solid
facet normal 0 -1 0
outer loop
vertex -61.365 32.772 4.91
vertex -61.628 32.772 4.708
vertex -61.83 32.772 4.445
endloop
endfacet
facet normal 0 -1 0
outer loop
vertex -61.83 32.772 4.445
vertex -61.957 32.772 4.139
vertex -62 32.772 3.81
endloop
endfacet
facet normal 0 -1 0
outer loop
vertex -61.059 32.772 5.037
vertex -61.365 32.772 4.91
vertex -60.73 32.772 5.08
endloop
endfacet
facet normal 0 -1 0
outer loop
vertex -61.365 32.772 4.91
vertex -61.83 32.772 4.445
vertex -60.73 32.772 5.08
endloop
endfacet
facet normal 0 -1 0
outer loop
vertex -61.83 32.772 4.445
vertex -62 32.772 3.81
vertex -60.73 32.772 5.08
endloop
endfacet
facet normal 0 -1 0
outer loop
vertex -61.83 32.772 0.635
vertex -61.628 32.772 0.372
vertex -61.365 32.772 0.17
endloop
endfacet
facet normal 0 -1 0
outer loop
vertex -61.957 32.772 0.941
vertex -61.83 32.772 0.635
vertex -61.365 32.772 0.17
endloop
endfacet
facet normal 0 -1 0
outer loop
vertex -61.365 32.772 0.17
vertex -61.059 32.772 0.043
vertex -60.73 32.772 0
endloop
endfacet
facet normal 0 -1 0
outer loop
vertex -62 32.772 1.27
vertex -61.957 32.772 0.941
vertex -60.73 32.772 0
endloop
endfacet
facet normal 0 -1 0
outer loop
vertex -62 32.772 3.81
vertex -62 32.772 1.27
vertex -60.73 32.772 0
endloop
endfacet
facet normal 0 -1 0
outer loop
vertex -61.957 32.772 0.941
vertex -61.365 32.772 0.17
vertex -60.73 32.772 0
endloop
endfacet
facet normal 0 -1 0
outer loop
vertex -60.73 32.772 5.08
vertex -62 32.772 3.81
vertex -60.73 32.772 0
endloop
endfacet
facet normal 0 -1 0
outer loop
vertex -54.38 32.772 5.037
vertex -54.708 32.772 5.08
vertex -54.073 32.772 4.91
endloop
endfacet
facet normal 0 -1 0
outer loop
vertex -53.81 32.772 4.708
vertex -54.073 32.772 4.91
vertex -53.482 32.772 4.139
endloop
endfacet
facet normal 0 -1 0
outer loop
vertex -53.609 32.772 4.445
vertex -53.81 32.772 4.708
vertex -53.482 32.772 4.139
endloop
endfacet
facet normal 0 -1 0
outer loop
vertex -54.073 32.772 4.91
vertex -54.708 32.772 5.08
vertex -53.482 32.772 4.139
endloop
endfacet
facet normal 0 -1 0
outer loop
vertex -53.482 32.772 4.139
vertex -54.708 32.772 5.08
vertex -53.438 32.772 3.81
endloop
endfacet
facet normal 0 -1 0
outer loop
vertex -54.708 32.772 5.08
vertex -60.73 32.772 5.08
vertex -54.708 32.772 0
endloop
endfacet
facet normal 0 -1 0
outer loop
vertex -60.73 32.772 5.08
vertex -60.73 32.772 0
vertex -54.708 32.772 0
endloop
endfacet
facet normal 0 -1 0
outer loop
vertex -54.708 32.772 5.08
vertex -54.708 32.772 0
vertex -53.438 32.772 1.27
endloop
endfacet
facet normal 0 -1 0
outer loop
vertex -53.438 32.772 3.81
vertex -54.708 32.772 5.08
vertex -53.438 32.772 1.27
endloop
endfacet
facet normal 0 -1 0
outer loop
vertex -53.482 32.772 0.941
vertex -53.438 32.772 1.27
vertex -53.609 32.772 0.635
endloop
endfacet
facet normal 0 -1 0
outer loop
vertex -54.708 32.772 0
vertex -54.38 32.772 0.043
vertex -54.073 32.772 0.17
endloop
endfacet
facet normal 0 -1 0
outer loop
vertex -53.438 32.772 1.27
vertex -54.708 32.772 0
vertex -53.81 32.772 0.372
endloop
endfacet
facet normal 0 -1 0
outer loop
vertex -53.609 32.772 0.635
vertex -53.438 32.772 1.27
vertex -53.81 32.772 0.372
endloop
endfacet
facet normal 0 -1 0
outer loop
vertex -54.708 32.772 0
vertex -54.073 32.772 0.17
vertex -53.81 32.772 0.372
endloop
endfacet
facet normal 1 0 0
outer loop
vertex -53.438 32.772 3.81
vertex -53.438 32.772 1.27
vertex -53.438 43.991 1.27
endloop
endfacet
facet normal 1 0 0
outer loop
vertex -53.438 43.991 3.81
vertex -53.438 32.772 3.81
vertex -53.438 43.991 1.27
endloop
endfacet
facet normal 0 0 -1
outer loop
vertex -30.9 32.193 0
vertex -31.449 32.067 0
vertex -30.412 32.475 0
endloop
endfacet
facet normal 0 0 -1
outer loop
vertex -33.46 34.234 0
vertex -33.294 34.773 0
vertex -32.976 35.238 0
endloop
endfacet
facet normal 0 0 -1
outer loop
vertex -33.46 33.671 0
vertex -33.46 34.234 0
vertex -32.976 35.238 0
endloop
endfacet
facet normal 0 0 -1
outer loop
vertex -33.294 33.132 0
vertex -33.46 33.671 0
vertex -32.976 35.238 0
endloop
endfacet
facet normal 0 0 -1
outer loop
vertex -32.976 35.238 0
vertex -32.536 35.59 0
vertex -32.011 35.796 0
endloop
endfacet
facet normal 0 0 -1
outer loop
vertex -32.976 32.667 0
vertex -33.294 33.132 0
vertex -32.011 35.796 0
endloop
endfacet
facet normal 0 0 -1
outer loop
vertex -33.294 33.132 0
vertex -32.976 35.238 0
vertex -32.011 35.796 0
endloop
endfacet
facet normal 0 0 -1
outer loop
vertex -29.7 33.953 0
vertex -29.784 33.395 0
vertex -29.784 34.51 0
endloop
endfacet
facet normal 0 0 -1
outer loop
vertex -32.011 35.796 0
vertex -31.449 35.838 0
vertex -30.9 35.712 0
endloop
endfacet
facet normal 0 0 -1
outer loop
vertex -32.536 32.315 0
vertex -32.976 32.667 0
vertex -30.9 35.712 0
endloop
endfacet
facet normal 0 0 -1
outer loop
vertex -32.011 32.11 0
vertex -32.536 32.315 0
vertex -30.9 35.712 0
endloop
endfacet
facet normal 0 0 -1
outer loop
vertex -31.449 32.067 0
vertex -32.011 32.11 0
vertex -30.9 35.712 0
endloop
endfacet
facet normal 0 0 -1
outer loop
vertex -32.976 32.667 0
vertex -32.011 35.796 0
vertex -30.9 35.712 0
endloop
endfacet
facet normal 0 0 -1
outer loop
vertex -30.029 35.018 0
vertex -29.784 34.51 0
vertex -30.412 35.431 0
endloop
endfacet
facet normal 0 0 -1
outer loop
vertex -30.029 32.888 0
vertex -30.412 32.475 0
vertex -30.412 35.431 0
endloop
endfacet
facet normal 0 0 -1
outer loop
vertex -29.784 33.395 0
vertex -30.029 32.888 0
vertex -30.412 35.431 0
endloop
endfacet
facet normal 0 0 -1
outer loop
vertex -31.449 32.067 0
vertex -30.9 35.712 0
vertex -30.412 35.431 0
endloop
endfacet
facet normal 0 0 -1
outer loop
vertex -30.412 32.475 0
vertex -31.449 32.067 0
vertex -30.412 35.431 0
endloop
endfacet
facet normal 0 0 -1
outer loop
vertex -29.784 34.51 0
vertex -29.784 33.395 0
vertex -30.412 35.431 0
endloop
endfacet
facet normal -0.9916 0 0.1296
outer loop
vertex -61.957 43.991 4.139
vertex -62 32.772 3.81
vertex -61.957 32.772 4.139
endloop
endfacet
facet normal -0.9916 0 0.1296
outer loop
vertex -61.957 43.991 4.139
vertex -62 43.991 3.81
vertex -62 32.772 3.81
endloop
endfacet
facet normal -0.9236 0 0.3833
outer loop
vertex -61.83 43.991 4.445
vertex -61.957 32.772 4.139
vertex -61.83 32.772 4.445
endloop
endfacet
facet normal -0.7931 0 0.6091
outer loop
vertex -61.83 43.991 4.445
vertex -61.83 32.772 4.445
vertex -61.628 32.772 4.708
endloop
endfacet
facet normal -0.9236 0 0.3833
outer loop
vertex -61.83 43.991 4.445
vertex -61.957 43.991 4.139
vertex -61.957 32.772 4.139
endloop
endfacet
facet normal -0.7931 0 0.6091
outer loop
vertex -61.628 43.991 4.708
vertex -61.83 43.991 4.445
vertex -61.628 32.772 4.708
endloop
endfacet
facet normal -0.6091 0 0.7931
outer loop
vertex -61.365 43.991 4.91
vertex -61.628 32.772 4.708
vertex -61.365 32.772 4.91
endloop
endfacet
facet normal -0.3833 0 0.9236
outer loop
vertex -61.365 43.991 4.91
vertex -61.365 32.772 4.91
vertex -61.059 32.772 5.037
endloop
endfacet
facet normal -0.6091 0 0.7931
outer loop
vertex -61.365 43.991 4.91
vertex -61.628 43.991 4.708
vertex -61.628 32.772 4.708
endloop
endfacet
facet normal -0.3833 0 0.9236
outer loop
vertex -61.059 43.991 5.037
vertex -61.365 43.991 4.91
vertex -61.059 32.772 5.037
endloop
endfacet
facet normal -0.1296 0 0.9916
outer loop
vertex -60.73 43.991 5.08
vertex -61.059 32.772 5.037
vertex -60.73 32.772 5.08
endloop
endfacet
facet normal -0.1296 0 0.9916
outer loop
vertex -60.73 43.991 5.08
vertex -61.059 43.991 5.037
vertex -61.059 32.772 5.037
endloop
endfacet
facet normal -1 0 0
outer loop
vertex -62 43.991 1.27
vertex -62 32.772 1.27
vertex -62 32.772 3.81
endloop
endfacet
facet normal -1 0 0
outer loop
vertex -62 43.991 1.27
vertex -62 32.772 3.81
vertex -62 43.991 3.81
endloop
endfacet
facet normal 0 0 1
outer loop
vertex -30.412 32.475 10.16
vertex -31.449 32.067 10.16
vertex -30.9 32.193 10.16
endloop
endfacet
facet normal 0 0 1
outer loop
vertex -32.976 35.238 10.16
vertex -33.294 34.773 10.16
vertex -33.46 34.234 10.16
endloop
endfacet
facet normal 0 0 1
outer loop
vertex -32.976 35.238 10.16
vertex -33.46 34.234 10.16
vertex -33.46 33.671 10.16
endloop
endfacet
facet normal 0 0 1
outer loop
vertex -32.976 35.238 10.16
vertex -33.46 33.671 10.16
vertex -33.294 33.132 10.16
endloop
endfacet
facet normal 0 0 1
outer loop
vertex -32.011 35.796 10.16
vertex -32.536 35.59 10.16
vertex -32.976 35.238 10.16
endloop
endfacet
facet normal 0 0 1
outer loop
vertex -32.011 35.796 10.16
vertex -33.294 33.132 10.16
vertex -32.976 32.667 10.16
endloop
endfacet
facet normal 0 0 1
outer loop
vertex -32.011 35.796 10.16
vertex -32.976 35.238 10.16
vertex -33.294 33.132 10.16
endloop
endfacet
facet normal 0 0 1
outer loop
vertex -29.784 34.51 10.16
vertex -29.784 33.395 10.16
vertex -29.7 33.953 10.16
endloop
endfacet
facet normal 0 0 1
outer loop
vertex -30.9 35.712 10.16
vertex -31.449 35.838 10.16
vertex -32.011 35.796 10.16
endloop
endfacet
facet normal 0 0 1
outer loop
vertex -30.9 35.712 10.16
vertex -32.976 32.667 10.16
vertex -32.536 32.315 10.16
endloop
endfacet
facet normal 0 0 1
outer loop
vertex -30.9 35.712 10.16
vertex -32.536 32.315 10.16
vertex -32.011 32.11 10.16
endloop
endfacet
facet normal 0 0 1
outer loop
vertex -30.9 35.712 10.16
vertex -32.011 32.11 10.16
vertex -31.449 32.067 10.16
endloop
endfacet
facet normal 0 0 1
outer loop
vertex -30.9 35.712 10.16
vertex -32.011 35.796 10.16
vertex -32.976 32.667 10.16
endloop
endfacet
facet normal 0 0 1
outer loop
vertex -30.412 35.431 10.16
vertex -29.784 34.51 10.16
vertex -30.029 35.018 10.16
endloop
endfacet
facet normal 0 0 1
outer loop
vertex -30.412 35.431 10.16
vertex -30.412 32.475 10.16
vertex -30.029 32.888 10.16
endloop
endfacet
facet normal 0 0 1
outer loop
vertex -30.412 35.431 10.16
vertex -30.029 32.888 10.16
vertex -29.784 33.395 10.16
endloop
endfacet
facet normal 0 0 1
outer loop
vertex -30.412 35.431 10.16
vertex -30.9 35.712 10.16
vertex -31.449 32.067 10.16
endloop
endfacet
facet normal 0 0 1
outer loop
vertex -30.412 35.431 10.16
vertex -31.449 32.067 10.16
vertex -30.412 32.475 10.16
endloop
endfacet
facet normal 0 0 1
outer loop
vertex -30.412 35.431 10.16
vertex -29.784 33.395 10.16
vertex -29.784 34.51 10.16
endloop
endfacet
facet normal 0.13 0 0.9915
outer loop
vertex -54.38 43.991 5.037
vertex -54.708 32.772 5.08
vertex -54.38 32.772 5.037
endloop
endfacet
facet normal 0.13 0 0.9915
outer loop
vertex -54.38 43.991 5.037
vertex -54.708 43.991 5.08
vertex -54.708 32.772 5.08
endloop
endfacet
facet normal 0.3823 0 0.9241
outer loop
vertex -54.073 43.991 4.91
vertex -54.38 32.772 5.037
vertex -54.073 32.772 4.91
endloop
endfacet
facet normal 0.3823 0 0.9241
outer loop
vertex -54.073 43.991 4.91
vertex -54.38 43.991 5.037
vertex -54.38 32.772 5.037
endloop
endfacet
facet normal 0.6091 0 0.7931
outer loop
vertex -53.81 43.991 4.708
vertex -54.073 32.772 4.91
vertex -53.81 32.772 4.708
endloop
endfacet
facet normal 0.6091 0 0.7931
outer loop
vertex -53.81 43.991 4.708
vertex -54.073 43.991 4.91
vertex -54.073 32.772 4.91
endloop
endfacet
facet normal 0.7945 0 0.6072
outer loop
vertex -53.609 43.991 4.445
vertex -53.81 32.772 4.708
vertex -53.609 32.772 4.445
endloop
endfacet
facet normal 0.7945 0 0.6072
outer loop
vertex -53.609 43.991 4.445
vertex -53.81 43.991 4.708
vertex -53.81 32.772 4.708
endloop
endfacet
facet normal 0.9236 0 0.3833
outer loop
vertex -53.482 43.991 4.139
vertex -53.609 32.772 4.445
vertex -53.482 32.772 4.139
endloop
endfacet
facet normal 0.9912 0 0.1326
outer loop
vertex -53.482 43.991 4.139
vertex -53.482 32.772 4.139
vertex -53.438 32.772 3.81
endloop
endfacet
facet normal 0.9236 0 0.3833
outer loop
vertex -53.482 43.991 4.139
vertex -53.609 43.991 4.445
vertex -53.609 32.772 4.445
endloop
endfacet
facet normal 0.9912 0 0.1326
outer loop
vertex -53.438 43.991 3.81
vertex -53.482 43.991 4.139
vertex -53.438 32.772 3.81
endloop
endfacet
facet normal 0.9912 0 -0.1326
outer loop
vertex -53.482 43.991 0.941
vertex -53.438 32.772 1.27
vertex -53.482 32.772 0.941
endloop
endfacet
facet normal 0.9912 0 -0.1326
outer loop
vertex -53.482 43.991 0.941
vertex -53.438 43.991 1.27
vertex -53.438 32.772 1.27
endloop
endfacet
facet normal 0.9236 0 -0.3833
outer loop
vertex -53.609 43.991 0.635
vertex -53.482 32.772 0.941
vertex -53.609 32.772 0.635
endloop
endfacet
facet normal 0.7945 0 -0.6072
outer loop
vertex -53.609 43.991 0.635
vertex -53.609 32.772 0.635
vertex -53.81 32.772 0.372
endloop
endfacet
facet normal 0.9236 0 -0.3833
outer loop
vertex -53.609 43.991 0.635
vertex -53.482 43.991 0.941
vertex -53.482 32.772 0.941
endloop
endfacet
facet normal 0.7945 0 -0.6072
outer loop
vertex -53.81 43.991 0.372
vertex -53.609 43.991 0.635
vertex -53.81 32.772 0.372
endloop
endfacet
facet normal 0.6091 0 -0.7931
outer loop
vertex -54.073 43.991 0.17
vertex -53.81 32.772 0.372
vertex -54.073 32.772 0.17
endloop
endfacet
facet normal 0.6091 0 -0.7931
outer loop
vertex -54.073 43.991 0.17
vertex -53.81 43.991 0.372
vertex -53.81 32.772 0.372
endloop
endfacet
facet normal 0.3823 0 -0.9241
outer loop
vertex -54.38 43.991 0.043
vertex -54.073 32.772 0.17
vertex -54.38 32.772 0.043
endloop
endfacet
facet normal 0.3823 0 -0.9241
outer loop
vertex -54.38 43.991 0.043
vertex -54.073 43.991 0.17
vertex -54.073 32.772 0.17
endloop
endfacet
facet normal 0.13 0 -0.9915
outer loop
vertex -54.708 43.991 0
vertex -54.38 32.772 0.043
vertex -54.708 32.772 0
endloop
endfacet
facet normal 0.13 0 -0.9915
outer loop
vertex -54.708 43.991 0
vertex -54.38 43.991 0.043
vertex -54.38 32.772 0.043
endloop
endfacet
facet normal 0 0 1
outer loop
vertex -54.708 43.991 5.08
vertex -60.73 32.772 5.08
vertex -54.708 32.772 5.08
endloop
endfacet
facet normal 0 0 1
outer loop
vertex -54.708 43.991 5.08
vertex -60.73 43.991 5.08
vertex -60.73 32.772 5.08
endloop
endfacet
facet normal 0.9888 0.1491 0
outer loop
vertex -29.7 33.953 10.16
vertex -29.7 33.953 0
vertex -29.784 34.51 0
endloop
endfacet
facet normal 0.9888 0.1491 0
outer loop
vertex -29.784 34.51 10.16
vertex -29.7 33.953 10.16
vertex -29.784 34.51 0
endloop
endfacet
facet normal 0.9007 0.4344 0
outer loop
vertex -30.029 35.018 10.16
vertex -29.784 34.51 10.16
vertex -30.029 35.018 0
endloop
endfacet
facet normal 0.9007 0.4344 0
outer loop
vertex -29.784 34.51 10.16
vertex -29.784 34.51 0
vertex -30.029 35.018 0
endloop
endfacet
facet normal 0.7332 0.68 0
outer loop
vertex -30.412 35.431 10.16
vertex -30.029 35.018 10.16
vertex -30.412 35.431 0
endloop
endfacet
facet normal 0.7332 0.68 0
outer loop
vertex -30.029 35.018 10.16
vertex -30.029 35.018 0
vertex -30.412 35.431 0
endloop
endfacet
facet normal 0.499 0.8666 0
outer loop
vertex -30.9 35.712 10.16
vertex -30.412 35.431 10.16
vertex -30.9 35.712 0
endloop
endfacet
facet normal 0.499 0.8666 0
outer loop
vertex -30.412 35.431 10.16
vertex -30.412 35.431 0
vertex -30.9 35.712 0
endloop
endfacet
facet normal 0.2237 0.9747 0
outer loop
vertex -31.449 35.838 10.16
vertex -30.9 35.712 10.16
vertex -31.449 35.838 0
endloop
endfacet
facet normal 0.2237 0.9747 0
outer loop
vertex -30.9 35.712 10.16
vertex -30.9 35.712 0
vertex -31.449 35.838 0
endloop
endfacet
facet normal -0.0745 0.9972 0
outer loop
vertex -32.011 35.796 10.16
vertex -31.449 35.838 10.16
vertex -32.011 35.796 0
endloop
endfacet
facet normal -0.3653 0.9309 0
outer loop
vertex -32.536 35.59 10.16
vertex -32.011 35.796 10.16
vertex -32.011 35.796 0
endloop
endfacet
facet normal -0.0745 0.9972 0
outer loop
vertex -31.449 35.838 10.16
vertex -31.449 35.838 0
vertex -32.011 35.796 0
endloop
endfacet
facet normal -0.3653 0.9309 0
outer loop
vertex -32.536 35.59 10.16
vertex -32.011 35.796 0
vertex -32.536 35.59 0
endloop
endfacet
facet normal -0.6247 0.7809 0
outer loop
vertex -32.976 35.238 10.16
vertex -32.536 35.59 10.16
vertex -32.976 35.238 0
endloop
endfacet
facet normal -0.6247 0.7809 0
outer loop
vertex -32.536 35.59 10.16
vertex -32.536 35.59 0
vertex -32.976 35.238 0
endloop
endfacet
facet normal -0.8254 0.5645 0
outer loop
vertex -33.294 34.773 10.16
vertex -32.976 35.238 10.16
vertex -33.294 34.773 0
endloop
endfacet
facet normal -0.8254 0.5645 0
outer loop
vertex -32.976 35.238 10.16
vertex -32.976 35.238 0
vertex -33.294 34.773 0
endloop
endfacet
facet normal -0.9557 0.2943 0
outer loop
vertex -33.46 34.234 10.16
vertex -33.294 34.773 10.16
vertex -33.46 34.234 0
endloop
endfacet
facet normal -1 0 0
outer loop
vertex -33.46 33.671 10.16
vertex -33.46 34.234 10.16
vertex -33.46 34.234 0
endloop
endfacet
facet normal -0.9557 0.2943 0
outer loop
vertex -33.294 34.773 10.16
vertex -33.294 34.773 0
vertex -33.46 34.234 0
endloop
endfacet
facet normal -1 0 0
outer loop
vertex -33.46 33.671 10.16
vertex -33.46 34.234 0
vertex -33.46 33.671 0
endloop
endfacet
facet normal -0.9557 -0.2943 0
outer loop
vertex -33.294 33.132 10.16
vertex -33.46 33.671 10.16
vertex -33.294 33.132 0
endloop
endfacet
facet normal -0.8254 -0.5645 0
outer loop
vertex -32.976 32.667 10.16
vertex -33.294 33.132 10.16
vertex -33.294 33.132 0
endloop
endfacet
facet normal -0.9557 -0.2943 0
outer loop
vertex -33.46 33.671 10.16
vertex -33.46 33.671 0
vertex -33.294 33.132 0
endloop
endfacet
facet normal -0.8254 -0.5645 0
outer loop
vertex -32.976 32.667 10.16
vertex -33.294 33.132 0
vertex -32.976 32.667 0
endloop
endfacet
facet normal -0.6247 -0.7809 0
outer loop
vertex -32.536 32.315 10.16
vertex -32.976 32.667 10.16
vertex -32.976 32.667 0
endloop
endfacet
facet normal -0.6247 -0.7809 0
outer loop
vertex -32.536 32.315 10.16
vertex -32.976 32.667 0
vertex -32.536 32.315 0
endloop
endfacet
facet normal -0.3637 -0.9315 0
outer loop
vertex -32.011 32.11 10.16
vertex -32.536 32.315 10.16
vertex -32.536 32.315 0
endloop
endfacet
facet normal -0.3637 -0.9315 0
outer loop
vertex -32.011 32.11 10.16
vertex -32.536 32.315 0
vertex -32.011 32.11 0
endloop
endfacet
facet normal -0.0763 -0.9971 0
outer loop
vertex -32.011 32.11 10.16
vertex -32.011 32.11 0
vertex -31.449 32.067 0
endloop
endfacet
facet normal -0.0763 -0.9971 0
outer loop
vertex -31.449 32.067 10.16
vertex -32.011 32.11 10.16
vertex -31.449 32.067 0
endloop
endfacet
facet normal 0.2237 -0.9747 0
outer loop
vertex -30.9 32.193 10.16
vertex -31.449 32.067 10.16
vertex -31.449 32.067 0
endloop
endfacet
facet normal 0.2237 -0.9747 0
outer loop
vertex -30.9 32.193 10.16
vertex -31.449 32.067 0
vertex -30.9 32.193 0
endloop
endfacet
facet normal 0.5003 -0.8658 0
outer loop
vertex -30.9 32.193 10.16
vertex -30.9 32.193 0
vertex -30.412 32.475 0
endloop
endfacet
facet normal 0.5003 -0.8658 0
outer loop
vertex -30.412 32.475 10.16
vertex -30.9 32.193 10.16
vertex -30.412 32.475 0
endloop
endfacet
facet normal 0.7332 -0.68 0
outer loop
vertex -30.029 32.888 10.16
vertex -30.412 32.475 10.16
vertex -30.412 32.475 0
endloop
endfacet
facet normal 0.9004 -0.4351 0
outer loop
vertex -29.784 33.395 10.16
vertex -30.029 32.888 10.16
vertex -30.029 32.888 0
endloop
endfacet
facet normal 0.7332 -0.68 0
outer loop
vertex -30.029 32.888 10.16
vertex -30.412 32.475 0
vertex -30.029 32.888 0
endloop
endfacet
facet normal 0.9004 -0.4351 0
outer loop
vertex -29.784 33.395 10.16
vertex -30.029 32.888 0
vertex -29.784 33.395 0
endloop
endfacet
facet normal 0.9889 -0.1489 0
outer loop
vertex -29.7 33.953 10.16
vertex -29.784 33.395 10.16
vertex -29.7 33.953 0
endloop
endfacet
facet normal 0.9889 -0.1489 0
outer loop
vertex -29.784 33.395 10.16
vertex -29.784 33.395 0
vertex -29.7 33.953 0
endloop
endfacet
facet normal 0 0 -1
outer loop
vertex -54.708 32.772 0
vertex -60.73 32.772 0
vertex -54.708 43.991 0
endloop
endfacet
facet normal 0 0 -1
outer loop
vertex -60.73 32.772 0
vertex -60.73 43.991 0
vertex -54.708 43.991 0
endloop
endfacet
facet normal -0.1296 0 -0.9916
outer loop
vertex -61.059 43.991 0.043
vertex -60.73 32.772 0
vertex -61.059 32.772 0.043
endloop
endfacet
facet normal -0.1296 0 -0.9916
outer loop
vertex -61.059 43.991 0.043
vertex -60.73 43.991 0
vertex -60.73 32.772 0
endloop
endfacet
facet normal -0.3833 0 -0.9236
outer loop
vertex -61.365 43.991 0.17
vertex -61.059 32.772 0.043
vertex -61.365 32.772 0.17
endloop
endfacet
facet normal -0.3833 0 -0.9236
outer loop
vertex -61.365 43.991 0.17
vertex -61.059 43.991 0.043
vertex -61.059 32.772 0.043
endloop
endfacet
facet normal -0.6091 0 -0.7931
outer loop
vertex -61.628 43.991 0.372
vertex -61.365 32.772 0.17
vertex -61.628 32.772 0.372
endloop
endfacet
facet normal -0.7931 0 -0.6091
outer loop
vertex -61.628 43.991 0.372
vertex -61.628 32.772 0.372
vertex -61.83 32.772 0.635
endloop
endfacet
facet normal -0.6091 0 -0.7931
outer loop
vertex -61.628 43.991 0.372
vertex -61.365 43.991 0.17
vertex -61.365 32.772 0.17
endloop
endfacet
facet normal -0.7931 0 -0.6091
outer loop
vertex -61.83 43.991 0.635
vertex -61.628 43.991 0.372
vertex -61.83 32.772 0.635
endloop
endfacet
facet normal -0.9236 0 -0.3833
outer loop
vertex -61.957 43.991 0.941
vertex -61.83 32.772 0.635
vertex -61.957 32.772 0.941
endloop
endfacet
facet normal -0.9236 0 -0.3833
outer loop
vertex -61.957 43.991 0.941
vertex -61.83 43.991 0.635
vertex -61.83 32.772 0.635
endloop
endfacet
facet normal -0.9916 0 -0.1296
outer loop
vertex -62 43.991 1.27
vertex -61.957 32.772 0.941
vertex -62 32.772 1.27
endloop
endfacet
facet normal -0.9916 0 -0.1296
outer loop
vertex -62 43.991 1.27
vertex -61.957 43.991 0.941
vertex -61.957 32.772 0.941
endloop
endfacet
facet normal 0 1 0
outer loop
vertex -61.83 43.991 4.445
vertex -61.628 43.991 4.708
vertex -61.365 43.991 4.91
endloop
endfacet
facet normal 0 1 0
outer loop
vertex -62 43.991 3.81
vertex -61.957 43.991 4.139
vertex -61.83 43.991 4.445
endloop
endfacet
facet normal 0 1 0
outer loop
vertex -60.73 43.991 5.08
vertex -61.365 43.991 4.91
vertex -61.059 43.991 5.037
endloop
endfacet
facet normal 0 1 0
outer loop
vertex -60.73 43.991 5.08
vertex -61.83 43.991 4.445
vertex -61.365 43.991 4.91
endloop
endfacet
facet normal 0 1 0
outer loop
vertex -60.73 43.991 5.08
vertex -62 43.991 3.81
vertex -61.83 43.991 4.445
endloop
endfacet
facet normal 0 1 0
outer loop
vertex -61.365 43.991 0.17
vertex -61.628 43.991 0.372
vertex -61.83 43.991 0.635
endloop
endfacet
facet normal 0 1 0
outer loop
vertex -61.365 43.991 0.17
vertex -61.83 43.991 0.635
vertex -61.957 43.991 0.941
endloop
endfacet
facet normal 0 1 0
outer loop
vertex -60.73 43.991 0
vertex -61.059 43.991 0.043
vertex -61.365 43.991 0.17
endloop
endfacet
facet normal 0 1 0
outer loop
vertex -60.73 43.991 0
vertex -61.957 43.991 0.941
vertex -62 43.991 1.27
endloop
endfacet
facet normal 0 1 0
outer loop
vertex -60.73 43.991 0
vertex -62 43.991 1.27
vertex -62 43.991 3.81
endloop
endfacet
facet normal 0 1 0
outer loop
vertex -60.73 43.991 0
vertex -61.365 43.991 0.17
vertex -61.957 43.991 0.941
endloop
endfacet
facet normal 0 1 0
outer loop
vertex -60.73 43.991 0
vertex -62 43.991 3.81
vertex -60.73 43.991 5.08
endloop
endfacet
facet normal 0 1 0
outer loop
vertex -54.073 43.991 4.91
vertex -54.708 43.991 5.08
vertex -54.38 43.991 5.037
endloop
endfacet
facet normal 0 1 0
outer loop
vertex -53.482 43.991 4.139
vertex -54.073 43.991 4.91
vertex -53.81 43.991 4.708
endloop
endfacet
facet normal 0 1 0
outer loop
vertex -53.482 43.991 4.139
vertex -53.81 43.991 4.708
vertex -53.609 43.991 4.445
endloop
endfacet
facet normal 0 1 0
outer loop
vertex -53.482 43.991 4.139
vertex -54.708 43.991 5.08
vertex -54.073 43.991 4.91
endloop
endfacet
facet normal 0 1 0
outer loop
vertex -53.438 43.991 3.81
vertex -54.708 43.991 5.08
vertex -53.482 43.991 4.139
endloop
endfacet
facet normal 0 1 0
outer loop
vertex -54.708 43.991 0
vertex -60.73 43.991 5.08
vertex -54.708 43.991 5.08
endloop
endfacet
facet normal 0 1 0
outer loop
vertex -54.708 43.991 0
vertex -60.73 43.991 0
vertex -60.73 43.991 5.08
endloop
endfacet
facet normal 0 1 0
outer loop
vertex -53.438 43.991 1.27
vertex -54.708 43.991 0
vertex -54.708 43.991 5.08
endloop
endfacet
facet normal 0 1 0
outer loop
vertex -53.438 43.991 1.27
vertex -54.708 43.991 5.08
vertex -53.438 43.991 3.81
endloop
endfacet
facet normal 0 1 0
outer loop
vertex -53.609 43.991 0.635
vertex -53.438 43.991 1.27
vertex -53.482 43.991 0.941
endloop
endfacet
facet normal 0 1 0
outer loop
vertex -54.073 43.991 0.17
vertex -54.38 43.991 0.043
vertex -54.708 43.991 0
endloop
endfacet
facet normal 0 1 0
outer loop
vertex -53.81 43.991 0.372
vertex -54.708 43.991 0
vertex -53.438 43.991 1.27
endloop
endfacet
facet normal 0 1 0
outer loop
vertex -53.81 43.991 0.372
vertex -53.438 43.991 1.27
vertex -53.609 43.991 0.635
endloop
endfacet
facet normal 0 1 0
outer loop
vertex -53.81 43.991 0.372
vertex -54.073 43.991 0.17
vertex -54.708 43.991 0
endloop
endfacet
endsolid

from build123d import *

# Parameters (mm, degrees)
F0_R     = 1.890456
F1_DEPTH = 10.16
F2_W     = 8.561958
F2_H     = 11.21911
F3_DEPTH = 5.08
F4_R     = 1.27
F5_R     = 1.27
F6_R     = 1.27
F7_R     = 1.27


with BuildPart() as f1:
    # F0 (on Top) → F1 (new body)
    with BuildSketch(Plane.XY):
        with Locations((-31.590663, 33.952583)):
            Circle(F0_R)
    extrude(amount=F1_DEPTH)


with BuildPart() as f3:
    # F2 (on Top) → F3 (new body)
    with BuildSketch(Plane.XY):
        with Locations((-57.719393, 38.38118)):
            Rectangle(F2_W, F2_H)
    extrude(amount=F3_DEPTH)

    # F4
    f4_edges = [f3.edges().sort_by_distance(p)[0] for p in [
        (-62.000372, 38.38118, 5.08),
    ]]
    fillet(f4_edges, radius=F4_R)

    # F5
    f5_edges = [f3.edges().sort_by_distance(p)[0] for p in [
        (-53.438414, 38.38118, 5.08),
    ]]
    fillet(f5_edges, radius=F5_R)

    # F6
    f6_edges = [f3.edges().sort_by_distance(p)[0] for p in [
        (-53.438414, 38.38118, 0),
    ]]
    fillet(f6_edges, radius=F6_R)

    # F7
    f7_edges = [f3.edges().sort_by_distance(p)[0] for p in [
        (-62.000372, 38.38118, 0),
    ]]
    fillet(f7_edges, radius=F7_R)


solid = Compound([f1.part, f3.part])
